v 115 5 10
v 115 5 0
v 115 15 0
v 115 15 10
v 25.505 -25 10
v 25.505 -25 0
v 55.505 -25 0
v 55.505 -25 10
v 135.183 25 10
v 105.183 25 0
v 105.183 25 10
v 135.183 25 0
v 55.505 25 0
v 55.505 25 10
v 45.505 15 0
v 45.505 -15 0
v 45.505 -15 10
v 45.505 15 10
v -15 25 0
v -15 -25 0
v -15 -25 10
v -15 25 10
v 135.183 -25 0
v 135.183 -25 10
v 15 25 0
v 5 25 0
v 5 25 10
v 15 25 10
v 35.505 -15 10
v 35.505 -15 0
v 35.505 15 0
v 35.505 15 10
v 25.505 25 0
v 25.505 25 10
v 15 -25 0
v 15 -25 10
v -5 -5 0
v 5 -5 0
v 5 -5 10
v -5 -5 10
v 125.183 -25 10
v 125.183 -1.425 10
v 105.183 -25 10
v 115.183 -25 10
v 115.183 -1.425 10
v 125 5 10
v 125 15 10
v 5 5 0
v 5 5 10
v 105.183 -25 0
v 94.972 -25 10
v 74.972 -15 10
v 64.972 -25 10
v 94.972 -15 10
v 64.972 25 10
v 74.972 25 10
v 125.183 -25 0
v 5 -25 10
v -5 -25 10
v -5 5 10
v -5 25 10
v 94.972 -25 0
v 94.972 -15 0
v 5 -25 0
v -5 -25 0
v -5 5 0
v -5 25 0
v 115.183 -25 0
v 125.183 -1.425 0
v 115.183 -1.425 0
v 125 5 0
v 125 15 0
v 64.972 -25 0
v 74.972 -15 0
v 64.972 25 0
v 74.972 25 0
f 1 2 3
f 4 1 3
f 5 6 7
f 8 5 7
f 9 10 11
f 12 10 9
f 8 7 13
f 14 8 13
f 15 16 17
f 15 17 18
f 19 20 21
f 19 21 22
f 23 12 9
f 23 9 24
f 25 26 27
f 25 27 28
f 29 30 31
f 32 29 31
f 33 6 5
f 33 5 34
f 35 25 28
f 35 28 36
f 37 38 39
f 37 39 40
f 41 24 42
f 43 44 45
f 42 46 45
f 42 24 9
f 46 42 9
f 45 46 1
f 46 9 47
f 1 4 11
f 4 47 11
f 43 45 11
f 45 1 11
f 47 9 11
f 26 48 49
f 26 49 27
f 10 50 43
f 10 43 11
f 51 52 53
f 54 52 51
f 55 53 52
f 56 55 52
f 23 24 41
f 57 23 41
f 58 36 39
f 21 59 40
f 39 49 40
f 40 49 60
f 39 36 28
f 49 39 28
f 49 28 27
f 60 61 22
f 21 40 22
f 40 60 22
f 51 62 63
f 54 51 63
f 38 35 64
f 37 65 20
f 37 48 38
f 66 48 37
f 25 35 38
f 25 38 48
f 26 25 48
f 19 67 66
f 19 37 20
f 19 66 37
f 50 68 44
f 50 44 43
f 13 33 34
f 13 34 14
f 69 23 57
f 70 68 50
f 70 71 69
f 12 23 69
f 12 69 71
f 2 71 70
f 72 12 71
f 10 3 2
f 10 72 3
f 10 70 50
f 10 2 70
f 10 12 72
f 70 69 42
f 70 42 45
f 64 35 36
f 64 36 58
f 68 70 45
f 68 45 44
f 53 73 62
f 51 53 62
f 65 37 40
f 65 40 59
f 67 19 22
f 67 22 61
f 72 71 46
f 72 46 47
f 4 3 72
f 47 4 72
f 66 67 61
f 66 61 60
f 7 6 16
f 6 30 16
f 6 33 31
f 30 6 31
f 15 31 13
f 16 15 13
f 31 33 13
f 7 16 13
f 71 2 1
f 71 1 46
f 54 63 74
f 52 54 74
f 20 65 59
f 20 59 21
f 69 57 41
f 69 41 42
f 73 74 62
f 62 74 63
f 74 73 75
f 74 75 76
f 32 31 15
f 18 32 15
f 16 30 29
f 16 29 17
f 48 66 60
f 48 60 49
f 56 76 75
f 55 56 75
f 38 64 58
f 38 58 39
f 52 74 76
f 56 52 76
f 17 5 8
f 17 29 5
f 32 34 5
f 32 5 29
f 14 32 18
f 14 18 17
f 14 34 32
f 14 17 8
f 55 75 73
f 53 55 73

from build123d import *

# Parameters (mm, degrees)
PAD_DEPTH     = 10
SKETCH001_W   = 30
SKETCH001_H   = 50
SKETCH001_W_2 = 10
SKETCH001_H_2 = 30
PAD001_DEPTH  = 10
PAD002_DEPTH  = 10
SKETCH003_W   = 10
SKETCH003_H   = 10
PAD003_DEPTH  = 10


with BuildPart() as h:
    # Sketch → Pad (new body)
    with BuildSketch(Plane.XY):
        Polygon((-15, 25), (-5, 25), (-4.999917, 5.000041), (5.000083, 5), (5, 25), (15, 25), (15, -25), (5, -25), (5.000083, -5), (-4.999917, -4.999959), (-5, -25.000041), (-15, -25), align=None)
    extrude(amount=PAD_DEPTH)


with BuildPart() as o:
    # Sketch001 → Pad001 (new body)
    with BuildSketch(Plane(origin=(40, 0, 0), x_dir=(1, 0, 0), z_dir=(0, 0, 1))):
        with Locations((0.505424, 0)):
            Rectangle(SKETCH001_W, SKETCH001_H)
        with Locations((0.505424, 0)):
            Rectangle(SKETCH001_W_2, SKETCH001_H_2, mode=Mode.SUBTRACT)
    extrude(amount=PAD001_DEPTH)


with BuildPart() as l:
    # Sketch002 → Pad002 (new body)
    with BuildSketch(Plane(origin=(85, 0, 0), x_dir=(1, 0, 0), z_dir=(0, 0, 1))):
        Polygon((-20.027875, -25), (9.972125, -25), (9.972125, -15), (-10.027875, -15), (-10.027875, 25), (-20.027875, 25), align=None)
    extrude(amount=PAD002_DEPTH)


with BuildPart() as a:
    # Sketch003 → Pad003 (new body)
    with BuildSketch(Plane(origin=(125, 0, 0), x_dir=(1, 0, 0), z_dir=(0, 0, 1))):
        Polygon((-19.816504, -25), (-19.816504, 25), (10.183496, 25), (10.183496, -25), (0.183496, -25), (0.183496, -1.425298), (-9.816504, -1.425298), (-9.816504, -25), align=None)
        with Locations((-5, 10)):
            Rectangle(SKETCH003_W, SKETCH003_H, mode=Mode.SUBTRACT)
    extrude(amount=PAD003_DEPTH)


solid = Compound([h.part, o.part, l.part, a.part])
